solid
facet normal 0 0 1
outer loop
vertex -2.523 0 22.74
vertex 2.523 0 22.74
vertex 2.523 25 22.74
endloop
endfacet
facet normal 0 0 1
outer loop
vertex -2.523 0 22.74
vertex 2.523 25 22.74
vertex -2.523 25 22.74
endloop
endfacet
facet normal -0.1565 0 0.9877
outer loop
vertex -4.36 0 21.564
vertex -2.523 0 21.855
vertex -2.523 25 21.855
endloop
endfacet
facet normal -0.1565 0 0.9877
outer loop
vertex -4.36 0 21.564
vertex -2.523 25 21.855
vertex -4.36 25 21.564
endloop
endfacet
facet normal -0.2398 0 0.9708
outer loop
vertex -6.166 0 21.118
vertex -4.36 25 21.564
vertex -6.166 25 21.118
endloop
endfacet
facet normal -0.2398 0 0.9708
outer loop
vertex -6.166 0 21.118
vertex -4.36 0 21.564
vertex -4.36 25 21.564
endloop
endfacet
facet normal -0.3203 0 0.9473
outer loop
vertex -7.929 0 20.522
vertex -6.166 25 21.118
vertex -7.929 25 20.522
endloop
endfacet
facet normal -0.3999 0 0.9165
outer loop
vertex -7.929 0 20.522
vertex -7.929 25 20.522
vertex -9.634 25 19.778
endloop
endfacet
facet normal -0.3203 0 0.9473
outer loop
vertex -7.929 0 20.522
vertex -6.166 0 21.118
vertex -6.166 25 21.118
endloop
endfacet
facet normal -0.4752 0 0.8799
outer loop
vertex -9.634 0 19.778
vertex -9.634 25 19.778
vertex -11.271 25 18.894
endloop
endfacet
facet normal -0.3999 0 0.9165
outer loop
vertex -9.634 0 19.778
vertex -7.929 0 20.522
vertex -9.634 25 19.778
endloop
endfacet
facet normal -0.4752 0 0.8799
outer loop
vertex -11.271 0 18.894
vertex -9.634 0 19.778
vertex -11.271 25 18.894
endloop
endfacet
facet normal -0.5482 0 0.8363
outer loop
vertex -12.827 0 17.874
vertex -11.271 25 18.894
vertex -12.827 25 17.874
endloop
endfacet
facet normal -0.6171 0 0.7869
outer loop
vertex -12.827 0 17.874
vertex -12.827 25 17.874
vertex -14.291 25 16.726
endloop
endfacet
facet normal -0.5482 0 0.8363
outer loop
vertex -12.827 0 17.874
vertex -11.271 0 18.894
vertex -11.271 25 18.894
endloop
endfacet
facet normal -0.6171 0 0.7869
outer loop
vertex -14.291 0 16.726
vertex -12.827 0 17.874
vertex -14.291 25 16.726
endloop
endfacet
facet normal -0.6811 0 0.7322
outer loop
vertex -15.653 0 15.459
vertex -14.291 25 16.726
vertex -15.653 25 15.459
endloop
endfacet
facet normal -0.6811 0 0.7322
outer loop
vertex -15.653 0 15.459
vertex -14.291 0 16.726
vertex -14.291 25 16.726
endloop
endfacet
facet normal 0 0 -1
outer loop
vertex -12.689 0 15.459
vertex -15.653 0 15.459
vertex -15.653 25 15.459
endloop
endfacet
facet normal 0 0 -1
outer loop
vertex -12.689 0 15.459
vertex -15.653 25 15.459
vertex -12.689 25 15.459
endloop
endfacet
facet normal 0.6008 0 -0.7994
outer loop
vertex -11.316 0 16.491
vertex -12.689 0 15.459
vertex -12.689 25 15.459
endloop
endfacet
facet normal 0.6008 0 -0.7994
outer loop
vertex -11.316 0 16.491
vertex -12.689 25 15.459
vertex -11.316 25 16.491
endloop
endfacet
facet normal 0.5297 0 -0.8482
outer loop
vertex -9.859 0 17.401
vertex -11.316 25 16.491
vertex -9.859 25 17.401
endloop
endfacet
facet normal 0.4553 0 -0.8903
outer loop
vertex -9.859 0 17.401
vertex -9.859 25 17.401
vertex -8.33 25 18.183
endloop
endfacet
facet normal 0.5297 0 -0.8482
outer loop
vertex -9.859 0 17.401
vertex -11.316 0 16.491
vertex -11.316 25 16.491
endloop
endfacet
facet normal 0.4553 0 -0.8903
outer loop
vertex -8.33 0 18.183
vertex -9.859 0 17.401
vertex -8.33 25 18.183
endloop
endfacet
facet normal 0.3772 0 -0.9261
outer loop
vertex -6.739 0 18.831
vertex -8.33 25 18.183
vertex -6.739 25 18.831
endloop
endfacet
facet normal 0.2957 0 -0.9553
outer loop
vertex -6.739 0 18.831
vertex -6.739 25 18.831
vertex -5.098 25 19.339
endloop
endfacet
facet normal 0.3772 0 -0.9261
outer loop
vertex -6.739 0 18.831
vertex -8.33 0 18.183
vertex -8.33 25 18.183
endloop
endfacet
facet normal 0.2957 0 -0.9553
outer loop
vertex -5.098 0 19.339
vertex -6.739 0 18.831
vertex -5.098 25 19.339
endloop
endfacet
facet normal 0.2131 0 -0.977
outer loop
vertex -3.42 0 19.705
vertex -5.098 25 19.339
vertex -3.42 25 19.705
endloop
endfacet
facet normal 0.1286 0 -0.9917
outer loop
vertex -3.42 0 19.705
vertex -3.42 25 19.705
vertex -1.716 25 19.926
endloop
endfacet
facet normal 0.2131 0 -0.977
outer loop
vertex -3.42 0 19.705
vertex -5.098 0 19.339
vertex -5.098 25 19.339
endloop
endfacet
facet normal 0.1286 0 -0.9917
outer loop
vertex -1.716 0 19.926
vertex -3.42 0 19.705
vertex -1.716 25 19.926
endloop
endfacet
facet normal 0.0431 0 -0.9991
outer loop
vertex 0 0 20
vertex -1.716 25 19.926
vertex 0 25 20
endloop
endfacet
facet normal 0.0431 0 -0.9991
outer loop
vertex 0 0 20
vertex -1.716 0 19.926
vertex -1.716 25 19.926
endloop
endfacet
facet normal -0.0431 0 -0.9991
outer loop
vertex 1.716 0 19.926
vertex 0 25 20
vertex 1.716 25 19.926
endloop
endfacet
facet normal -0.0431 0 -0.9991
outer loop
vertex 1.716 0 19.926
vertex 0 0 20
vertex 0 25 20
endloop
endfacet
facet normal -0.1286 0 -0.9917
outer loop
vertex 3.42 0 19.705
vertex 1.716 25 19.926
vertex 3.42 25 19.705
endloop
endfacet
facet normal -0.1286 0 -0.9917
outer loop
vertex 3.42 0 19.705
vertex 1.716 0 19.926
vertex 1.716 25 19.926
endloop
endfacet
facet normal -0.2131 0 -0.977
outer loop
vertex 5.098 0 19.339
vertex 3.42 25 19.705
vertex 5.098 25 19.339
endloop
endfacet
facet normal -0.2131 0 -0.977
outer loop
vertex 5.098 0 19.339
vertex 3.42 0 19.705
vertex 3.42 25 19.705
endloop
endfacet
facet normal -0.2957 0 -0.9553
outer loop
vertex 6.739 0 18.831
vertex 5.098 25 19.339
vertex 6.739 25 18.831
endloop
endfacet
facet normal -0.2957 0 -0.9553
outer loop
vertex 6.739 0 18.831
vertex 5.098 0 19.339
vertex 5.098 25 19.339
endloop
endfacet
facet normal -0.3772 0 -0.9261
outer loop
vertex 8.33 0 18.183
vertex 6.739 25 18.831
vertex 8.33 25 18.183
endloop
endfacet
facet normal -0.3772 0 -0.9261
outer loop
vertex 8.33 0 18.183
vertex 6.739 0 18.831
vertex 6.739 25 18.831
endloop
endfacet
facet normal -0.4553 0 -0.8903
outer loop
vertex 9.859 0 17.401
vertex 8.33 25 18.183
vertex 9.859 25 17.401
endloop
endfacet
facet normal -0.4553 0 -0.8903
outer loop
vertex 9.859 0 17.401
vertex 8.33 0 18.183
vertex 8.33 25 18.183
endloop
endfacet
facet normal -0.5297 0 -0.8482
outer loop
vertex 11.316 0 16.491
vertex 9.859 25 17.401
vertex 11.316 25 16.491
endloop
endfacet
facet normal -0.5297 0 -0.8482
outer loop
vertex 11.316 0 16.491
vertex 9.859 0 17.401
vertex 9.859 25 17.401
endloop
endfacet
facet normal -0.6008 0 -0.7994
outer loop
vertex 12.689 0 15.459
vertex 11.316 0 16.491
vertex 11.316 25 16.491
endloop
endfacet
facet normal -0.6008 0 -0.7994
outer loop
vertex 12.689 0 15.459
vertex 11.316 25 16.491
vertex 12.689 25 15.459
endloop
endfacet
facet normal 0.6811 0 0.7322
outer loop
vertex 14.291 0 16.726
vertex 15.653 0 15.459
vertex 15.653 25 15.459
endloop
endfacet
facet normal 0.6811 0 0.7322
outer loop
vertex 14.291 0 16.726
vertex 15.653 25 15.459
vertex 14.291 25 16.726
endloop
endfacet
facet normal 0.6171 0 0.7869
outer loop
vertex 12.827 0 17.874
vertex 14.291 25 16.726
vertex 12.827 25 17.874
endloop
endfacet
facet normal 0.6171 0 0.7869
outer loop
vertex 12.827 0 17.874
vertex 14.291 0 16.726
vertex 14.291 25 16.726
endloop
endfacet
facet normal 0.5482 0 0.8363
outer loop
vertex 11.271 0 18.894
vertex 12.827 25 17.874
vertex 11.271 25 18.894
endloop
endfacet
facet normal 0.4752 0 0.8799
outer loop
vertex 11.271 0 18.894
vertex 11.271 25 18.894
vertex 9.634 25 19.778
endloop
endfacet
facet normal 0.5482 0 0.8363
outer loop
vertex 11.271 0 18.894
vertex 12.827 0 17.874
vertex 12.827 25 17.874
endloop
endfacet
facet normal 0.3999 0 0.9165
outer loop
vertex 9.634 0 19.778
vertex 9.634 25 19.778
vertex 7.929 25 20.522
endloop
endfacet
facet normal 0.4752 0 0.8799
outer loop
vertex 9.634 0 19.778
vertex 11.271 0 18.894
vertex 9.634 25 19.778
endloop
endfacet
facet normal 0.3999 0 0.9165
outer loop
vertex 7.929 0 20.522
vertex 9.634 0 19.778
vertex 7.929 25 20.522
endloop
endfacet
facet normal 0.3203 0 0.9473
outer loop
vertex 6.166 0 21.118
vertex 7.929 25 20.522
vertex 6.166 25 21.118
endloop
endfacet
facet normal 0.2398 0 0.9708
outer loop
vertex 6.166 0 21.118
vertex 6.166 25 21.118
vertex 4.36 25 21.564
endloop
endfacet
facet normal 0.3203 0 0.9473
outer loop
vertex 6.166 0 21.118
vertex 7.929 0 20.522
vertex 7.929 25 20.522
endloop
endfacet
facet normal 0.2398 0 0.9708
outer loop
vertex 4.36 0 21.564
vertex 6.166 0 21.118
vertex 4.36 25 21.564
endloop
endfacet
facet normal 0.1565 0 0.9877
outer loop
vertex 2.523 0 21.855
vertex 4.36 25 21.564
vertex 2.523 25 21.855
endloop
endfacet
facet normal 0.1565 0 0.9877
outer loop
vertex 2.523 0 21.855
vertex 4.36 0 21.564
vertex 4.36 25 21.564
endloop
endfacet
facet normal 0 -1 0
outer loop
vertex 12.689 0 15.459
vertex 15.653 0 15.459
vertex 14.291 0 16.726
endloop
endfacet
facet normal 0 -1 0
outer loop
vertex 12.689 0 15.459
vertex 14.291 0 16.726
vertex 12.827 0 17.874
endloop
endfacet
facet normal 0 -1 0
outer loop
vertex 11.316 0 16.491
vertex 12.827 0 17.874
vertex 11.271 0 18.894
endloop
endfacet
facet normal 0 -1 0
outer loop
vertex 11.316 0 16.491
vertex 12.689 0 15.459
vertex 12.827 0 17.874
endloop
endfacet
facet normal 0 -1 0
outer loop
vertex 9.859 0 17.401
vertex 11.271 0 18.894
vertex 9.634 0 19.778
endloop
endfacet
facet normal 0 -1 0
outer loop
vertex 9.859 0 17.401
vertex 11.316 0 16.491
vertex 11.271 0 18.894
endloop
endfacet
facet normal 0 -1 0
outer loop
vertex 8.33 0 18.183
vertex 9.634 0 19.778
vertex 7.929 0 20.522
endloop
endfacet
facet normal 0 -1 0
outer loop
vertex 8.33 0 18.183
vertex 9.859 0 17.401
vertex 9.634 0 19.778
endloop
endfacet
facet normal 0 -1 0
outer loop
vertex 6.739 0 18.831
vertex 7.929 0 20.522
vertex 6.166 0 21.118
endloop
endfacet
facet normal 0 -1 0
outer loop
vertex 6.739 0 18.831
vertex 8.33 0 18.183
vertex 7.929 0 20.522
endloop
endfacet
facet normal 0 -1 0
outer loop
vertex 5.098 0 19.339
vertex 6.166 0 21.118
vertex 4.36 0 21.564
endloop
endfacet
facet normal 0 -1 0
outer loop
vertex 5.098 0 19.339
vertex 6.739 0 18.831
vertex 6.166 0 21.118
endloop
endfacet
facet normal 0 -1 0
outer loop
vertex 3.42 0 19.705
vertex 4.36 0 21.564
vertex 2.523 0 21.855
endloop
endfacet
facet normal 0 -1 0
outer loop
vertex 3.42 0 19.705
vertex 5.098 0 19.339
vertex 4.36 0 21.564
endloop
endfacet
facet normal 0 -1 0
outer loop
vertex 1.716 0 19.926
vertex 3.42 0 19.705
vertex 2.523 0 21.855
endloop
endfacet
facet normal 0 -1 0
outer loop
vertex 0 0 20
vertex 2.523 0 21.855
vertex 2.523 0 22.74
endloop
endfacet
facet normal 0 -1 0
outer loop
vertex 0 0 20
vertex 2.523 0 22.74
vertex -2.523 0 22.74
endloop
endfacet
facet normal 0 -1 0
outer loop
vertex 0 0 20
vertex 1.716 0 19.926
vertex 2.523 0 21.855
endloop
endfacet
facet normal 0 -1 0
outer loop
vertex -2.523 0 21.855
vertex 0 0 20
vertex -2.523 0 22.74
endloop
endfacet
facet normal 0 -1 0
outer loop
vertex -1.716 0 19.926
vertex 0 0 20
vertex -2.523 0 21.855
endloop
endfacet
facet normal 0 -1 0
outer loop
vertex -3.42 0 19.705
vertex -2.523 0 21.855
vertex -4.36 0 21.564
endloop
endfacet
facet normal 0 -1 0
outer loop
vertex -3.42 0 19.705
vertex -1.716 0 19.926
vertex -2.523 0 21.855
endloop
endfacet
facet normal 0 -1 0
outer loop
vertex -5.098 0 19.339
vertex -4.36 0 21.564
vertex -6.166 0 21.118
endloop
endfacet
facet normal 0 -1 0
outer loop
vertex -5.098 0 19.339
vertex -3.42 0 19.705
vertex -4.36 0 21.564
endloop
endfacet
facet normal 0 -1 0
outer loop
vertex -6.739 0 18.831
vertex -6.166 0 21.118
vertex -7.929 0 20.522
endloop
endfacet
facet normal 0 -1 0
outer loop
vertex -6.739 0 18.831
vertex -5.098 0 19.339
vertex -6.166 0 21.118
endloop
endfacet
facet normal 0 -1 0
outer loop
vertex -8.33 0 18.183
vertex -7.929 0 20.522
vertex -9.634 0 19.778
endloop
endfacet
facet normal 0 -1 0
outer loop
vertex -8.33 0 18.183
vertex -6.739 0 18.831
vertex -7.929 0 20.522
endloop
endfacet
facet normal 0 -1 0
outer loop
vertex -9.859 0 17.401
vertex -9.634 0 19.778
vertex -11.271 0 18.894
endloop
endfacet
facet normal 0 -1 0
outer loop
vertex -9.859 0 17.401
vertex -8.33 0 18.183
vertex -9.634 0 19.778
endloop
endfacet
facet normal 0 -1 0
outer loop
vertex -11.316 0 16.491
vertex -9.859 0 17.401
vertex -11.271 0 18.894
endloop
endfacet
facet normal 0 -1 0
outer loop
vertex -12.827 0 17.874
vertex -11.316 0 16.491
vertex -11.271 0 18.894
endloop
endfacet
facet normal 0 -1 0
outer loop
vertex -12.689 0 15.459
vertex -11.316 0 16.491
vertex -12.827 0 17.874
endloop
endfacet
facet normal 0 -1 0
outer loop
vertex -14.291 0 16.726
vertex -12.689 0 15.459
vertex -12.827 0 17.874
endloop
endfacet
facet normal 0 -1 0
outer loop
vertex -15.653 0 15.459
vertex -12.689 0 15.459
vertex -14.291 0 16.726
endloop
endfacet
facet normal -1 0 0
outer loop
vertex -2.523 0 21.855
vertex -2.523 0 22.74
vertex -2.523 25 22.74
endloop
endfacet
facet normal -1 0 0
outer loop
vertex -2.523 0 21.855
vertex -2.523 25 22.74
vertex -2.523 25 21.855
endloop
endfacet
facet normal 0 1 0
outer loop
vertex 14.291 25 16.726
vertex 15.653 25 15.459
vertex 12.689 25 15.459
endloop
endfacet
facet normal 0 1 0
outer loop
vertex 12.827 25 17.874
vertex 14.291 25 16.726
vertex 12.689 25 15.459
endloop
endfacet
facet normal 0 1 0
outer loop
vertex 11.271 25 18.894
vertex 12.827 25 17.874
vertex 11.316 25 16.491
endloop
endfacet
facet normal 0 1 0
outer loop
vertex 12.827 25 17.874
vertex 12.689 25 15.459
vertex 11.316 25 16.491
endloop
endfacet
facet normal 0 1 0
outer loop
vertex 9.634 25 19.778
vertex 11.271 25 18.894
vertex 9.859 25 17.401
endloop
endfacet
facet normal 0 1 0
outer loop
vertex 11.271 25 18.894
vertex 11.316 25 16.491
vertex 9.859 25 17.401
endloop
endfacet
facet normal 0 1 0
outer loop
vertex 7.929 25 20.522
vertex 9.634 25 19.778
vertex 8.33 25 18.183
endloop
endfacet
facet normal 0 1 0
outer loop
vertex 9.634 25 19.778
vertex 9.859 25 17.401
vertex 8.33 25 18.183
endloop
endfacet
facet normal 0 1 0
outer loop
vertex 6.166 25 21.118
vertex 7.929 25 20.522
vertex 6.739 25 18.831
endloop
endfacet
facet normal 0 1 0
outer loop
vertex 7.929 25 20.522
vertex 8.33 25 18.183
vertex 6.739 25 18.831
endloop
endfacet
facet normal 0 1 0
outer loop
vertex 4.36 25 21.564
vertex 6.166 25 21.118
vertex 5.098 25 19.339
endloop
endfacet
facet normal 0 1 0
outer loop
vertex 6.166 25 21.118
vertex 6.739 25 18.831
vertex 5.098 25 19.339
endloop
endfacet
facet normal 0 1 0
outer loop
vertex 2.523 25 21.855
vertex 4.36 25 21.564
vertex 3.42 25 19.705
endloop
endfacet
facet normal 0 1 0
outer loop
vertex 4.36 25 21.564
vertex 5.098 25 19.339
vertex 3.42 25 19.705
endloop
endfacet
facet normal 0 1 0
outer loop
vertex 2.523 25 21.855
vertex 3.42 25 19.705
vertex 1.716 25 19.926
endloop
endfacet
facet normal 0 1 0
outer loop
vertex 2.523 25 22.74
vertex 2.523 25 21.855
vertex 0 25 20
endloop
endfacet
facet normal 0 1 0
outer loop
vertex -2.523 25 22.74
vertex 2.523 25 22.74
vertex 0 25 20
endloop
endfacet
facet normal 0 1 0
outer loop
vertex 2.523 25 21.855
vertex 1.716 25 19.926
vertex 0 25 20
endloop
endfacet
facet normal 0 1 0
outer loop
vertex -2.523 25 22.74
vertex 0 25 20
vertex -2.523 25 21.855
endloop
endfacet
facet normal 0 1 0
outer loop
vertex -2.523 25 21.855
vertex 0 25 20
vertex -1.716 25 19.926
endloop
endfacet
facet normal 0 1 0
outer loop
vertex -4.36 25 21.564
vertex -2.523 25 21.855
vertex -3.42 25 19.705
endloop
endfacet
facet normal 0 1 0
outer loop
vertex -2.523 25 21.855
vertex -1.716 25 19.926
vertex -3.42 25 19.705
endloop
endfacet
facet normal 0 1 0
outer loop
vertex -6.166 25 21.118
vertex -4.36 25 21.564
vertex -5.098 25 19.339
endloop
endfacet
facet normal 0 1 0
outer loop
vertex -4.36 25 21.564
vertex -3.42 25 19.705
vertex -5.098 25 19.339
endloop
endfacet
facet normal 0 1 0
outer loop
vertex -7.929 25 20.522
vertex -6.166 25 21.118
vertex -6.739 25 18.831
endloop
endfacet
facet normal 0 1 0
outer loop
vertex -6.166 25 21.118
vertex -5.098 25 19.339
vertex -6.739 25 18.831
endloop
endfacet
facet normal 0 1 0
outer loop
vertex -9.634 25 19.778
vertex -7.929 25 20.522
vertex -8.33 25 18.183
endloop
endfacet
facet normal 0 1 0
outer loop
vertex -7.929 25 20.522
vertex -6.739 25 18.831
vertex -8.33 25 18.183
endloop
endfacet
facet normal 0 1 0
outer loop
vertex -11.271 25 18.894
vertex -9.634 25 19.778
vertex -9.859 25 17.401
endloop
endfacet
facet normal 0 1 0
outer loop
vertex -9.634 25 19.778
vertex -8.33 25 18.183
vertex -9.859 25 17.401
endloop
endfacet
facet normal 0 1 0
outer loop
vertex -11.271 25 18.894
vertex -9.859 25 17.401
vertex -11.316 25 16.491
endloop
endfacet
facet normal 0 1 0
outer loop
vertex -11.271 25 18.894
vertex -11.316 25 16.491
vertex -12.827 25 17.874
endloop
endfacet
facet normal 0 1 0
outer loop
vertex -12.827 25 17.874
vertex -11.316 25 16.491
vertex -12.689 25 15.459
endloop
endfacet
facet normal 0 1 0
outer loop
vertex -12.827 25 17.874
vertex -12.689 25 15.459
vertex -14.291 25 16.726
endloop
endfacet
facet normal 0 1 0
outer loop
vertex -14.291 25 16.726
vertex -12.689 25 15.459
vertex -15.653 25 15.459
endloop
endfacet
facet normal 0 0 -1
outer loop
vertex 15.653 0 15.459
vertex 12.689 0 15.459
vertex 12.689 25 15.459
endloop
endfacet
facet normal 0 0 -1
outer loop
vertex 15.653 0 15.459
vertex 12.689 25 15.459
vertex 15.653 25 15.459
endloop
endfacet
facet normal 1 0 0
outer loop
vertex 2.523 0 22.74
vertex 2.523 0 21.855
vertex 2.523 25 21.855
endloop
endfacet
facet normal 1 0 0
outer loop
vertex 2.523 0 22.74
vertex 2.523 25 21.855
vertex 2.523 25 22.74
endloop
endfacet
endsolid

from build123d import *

# Parameters (mm, degrees)
BOSS_EXTRUDE1_DEPTH = 25


with BuildPart() as part:
    # Sketch1 → Boss-Extrude1 (new body)
    with BuildSketch(Plane(origin=(0, 0, 0), x_dir=(1, 0, 0), z_dir=(0, 1, 0))):
        with BuildLine():
            Line((-15.653135277, -15.458957145), (-12.689391002, -15.458957145))
            ThreePointArc((-12.689391002, -15.458957145), (0, -20), (12.689391002, -15.458957145))
            Line((12.689391002, -15.458957145), (15.653135277, -15.458957145))
            ThreePointArc((15.653135277, -15.458957145), (9.634106681, -19.778371734), (2.522561476, -21.854900677))
            Line((2.522561476, -21.854900677), (2.522561476, -22.740089193))
            Line((2.522561476, -22.740089193), (-2.522561476, -22.740089193))
            Line((-2.522561476, -22.740089193), (-2.522561476, -21.854900677))
            ThreePointArc((-2.522561476, -21.854900677), (-9.634106681, -19.778371734), (-15.653135277, -15.458957145))
        make_face()
    extrude(amount=BOSS_EXTRUDE1_DEPTH)


solid = part.part
